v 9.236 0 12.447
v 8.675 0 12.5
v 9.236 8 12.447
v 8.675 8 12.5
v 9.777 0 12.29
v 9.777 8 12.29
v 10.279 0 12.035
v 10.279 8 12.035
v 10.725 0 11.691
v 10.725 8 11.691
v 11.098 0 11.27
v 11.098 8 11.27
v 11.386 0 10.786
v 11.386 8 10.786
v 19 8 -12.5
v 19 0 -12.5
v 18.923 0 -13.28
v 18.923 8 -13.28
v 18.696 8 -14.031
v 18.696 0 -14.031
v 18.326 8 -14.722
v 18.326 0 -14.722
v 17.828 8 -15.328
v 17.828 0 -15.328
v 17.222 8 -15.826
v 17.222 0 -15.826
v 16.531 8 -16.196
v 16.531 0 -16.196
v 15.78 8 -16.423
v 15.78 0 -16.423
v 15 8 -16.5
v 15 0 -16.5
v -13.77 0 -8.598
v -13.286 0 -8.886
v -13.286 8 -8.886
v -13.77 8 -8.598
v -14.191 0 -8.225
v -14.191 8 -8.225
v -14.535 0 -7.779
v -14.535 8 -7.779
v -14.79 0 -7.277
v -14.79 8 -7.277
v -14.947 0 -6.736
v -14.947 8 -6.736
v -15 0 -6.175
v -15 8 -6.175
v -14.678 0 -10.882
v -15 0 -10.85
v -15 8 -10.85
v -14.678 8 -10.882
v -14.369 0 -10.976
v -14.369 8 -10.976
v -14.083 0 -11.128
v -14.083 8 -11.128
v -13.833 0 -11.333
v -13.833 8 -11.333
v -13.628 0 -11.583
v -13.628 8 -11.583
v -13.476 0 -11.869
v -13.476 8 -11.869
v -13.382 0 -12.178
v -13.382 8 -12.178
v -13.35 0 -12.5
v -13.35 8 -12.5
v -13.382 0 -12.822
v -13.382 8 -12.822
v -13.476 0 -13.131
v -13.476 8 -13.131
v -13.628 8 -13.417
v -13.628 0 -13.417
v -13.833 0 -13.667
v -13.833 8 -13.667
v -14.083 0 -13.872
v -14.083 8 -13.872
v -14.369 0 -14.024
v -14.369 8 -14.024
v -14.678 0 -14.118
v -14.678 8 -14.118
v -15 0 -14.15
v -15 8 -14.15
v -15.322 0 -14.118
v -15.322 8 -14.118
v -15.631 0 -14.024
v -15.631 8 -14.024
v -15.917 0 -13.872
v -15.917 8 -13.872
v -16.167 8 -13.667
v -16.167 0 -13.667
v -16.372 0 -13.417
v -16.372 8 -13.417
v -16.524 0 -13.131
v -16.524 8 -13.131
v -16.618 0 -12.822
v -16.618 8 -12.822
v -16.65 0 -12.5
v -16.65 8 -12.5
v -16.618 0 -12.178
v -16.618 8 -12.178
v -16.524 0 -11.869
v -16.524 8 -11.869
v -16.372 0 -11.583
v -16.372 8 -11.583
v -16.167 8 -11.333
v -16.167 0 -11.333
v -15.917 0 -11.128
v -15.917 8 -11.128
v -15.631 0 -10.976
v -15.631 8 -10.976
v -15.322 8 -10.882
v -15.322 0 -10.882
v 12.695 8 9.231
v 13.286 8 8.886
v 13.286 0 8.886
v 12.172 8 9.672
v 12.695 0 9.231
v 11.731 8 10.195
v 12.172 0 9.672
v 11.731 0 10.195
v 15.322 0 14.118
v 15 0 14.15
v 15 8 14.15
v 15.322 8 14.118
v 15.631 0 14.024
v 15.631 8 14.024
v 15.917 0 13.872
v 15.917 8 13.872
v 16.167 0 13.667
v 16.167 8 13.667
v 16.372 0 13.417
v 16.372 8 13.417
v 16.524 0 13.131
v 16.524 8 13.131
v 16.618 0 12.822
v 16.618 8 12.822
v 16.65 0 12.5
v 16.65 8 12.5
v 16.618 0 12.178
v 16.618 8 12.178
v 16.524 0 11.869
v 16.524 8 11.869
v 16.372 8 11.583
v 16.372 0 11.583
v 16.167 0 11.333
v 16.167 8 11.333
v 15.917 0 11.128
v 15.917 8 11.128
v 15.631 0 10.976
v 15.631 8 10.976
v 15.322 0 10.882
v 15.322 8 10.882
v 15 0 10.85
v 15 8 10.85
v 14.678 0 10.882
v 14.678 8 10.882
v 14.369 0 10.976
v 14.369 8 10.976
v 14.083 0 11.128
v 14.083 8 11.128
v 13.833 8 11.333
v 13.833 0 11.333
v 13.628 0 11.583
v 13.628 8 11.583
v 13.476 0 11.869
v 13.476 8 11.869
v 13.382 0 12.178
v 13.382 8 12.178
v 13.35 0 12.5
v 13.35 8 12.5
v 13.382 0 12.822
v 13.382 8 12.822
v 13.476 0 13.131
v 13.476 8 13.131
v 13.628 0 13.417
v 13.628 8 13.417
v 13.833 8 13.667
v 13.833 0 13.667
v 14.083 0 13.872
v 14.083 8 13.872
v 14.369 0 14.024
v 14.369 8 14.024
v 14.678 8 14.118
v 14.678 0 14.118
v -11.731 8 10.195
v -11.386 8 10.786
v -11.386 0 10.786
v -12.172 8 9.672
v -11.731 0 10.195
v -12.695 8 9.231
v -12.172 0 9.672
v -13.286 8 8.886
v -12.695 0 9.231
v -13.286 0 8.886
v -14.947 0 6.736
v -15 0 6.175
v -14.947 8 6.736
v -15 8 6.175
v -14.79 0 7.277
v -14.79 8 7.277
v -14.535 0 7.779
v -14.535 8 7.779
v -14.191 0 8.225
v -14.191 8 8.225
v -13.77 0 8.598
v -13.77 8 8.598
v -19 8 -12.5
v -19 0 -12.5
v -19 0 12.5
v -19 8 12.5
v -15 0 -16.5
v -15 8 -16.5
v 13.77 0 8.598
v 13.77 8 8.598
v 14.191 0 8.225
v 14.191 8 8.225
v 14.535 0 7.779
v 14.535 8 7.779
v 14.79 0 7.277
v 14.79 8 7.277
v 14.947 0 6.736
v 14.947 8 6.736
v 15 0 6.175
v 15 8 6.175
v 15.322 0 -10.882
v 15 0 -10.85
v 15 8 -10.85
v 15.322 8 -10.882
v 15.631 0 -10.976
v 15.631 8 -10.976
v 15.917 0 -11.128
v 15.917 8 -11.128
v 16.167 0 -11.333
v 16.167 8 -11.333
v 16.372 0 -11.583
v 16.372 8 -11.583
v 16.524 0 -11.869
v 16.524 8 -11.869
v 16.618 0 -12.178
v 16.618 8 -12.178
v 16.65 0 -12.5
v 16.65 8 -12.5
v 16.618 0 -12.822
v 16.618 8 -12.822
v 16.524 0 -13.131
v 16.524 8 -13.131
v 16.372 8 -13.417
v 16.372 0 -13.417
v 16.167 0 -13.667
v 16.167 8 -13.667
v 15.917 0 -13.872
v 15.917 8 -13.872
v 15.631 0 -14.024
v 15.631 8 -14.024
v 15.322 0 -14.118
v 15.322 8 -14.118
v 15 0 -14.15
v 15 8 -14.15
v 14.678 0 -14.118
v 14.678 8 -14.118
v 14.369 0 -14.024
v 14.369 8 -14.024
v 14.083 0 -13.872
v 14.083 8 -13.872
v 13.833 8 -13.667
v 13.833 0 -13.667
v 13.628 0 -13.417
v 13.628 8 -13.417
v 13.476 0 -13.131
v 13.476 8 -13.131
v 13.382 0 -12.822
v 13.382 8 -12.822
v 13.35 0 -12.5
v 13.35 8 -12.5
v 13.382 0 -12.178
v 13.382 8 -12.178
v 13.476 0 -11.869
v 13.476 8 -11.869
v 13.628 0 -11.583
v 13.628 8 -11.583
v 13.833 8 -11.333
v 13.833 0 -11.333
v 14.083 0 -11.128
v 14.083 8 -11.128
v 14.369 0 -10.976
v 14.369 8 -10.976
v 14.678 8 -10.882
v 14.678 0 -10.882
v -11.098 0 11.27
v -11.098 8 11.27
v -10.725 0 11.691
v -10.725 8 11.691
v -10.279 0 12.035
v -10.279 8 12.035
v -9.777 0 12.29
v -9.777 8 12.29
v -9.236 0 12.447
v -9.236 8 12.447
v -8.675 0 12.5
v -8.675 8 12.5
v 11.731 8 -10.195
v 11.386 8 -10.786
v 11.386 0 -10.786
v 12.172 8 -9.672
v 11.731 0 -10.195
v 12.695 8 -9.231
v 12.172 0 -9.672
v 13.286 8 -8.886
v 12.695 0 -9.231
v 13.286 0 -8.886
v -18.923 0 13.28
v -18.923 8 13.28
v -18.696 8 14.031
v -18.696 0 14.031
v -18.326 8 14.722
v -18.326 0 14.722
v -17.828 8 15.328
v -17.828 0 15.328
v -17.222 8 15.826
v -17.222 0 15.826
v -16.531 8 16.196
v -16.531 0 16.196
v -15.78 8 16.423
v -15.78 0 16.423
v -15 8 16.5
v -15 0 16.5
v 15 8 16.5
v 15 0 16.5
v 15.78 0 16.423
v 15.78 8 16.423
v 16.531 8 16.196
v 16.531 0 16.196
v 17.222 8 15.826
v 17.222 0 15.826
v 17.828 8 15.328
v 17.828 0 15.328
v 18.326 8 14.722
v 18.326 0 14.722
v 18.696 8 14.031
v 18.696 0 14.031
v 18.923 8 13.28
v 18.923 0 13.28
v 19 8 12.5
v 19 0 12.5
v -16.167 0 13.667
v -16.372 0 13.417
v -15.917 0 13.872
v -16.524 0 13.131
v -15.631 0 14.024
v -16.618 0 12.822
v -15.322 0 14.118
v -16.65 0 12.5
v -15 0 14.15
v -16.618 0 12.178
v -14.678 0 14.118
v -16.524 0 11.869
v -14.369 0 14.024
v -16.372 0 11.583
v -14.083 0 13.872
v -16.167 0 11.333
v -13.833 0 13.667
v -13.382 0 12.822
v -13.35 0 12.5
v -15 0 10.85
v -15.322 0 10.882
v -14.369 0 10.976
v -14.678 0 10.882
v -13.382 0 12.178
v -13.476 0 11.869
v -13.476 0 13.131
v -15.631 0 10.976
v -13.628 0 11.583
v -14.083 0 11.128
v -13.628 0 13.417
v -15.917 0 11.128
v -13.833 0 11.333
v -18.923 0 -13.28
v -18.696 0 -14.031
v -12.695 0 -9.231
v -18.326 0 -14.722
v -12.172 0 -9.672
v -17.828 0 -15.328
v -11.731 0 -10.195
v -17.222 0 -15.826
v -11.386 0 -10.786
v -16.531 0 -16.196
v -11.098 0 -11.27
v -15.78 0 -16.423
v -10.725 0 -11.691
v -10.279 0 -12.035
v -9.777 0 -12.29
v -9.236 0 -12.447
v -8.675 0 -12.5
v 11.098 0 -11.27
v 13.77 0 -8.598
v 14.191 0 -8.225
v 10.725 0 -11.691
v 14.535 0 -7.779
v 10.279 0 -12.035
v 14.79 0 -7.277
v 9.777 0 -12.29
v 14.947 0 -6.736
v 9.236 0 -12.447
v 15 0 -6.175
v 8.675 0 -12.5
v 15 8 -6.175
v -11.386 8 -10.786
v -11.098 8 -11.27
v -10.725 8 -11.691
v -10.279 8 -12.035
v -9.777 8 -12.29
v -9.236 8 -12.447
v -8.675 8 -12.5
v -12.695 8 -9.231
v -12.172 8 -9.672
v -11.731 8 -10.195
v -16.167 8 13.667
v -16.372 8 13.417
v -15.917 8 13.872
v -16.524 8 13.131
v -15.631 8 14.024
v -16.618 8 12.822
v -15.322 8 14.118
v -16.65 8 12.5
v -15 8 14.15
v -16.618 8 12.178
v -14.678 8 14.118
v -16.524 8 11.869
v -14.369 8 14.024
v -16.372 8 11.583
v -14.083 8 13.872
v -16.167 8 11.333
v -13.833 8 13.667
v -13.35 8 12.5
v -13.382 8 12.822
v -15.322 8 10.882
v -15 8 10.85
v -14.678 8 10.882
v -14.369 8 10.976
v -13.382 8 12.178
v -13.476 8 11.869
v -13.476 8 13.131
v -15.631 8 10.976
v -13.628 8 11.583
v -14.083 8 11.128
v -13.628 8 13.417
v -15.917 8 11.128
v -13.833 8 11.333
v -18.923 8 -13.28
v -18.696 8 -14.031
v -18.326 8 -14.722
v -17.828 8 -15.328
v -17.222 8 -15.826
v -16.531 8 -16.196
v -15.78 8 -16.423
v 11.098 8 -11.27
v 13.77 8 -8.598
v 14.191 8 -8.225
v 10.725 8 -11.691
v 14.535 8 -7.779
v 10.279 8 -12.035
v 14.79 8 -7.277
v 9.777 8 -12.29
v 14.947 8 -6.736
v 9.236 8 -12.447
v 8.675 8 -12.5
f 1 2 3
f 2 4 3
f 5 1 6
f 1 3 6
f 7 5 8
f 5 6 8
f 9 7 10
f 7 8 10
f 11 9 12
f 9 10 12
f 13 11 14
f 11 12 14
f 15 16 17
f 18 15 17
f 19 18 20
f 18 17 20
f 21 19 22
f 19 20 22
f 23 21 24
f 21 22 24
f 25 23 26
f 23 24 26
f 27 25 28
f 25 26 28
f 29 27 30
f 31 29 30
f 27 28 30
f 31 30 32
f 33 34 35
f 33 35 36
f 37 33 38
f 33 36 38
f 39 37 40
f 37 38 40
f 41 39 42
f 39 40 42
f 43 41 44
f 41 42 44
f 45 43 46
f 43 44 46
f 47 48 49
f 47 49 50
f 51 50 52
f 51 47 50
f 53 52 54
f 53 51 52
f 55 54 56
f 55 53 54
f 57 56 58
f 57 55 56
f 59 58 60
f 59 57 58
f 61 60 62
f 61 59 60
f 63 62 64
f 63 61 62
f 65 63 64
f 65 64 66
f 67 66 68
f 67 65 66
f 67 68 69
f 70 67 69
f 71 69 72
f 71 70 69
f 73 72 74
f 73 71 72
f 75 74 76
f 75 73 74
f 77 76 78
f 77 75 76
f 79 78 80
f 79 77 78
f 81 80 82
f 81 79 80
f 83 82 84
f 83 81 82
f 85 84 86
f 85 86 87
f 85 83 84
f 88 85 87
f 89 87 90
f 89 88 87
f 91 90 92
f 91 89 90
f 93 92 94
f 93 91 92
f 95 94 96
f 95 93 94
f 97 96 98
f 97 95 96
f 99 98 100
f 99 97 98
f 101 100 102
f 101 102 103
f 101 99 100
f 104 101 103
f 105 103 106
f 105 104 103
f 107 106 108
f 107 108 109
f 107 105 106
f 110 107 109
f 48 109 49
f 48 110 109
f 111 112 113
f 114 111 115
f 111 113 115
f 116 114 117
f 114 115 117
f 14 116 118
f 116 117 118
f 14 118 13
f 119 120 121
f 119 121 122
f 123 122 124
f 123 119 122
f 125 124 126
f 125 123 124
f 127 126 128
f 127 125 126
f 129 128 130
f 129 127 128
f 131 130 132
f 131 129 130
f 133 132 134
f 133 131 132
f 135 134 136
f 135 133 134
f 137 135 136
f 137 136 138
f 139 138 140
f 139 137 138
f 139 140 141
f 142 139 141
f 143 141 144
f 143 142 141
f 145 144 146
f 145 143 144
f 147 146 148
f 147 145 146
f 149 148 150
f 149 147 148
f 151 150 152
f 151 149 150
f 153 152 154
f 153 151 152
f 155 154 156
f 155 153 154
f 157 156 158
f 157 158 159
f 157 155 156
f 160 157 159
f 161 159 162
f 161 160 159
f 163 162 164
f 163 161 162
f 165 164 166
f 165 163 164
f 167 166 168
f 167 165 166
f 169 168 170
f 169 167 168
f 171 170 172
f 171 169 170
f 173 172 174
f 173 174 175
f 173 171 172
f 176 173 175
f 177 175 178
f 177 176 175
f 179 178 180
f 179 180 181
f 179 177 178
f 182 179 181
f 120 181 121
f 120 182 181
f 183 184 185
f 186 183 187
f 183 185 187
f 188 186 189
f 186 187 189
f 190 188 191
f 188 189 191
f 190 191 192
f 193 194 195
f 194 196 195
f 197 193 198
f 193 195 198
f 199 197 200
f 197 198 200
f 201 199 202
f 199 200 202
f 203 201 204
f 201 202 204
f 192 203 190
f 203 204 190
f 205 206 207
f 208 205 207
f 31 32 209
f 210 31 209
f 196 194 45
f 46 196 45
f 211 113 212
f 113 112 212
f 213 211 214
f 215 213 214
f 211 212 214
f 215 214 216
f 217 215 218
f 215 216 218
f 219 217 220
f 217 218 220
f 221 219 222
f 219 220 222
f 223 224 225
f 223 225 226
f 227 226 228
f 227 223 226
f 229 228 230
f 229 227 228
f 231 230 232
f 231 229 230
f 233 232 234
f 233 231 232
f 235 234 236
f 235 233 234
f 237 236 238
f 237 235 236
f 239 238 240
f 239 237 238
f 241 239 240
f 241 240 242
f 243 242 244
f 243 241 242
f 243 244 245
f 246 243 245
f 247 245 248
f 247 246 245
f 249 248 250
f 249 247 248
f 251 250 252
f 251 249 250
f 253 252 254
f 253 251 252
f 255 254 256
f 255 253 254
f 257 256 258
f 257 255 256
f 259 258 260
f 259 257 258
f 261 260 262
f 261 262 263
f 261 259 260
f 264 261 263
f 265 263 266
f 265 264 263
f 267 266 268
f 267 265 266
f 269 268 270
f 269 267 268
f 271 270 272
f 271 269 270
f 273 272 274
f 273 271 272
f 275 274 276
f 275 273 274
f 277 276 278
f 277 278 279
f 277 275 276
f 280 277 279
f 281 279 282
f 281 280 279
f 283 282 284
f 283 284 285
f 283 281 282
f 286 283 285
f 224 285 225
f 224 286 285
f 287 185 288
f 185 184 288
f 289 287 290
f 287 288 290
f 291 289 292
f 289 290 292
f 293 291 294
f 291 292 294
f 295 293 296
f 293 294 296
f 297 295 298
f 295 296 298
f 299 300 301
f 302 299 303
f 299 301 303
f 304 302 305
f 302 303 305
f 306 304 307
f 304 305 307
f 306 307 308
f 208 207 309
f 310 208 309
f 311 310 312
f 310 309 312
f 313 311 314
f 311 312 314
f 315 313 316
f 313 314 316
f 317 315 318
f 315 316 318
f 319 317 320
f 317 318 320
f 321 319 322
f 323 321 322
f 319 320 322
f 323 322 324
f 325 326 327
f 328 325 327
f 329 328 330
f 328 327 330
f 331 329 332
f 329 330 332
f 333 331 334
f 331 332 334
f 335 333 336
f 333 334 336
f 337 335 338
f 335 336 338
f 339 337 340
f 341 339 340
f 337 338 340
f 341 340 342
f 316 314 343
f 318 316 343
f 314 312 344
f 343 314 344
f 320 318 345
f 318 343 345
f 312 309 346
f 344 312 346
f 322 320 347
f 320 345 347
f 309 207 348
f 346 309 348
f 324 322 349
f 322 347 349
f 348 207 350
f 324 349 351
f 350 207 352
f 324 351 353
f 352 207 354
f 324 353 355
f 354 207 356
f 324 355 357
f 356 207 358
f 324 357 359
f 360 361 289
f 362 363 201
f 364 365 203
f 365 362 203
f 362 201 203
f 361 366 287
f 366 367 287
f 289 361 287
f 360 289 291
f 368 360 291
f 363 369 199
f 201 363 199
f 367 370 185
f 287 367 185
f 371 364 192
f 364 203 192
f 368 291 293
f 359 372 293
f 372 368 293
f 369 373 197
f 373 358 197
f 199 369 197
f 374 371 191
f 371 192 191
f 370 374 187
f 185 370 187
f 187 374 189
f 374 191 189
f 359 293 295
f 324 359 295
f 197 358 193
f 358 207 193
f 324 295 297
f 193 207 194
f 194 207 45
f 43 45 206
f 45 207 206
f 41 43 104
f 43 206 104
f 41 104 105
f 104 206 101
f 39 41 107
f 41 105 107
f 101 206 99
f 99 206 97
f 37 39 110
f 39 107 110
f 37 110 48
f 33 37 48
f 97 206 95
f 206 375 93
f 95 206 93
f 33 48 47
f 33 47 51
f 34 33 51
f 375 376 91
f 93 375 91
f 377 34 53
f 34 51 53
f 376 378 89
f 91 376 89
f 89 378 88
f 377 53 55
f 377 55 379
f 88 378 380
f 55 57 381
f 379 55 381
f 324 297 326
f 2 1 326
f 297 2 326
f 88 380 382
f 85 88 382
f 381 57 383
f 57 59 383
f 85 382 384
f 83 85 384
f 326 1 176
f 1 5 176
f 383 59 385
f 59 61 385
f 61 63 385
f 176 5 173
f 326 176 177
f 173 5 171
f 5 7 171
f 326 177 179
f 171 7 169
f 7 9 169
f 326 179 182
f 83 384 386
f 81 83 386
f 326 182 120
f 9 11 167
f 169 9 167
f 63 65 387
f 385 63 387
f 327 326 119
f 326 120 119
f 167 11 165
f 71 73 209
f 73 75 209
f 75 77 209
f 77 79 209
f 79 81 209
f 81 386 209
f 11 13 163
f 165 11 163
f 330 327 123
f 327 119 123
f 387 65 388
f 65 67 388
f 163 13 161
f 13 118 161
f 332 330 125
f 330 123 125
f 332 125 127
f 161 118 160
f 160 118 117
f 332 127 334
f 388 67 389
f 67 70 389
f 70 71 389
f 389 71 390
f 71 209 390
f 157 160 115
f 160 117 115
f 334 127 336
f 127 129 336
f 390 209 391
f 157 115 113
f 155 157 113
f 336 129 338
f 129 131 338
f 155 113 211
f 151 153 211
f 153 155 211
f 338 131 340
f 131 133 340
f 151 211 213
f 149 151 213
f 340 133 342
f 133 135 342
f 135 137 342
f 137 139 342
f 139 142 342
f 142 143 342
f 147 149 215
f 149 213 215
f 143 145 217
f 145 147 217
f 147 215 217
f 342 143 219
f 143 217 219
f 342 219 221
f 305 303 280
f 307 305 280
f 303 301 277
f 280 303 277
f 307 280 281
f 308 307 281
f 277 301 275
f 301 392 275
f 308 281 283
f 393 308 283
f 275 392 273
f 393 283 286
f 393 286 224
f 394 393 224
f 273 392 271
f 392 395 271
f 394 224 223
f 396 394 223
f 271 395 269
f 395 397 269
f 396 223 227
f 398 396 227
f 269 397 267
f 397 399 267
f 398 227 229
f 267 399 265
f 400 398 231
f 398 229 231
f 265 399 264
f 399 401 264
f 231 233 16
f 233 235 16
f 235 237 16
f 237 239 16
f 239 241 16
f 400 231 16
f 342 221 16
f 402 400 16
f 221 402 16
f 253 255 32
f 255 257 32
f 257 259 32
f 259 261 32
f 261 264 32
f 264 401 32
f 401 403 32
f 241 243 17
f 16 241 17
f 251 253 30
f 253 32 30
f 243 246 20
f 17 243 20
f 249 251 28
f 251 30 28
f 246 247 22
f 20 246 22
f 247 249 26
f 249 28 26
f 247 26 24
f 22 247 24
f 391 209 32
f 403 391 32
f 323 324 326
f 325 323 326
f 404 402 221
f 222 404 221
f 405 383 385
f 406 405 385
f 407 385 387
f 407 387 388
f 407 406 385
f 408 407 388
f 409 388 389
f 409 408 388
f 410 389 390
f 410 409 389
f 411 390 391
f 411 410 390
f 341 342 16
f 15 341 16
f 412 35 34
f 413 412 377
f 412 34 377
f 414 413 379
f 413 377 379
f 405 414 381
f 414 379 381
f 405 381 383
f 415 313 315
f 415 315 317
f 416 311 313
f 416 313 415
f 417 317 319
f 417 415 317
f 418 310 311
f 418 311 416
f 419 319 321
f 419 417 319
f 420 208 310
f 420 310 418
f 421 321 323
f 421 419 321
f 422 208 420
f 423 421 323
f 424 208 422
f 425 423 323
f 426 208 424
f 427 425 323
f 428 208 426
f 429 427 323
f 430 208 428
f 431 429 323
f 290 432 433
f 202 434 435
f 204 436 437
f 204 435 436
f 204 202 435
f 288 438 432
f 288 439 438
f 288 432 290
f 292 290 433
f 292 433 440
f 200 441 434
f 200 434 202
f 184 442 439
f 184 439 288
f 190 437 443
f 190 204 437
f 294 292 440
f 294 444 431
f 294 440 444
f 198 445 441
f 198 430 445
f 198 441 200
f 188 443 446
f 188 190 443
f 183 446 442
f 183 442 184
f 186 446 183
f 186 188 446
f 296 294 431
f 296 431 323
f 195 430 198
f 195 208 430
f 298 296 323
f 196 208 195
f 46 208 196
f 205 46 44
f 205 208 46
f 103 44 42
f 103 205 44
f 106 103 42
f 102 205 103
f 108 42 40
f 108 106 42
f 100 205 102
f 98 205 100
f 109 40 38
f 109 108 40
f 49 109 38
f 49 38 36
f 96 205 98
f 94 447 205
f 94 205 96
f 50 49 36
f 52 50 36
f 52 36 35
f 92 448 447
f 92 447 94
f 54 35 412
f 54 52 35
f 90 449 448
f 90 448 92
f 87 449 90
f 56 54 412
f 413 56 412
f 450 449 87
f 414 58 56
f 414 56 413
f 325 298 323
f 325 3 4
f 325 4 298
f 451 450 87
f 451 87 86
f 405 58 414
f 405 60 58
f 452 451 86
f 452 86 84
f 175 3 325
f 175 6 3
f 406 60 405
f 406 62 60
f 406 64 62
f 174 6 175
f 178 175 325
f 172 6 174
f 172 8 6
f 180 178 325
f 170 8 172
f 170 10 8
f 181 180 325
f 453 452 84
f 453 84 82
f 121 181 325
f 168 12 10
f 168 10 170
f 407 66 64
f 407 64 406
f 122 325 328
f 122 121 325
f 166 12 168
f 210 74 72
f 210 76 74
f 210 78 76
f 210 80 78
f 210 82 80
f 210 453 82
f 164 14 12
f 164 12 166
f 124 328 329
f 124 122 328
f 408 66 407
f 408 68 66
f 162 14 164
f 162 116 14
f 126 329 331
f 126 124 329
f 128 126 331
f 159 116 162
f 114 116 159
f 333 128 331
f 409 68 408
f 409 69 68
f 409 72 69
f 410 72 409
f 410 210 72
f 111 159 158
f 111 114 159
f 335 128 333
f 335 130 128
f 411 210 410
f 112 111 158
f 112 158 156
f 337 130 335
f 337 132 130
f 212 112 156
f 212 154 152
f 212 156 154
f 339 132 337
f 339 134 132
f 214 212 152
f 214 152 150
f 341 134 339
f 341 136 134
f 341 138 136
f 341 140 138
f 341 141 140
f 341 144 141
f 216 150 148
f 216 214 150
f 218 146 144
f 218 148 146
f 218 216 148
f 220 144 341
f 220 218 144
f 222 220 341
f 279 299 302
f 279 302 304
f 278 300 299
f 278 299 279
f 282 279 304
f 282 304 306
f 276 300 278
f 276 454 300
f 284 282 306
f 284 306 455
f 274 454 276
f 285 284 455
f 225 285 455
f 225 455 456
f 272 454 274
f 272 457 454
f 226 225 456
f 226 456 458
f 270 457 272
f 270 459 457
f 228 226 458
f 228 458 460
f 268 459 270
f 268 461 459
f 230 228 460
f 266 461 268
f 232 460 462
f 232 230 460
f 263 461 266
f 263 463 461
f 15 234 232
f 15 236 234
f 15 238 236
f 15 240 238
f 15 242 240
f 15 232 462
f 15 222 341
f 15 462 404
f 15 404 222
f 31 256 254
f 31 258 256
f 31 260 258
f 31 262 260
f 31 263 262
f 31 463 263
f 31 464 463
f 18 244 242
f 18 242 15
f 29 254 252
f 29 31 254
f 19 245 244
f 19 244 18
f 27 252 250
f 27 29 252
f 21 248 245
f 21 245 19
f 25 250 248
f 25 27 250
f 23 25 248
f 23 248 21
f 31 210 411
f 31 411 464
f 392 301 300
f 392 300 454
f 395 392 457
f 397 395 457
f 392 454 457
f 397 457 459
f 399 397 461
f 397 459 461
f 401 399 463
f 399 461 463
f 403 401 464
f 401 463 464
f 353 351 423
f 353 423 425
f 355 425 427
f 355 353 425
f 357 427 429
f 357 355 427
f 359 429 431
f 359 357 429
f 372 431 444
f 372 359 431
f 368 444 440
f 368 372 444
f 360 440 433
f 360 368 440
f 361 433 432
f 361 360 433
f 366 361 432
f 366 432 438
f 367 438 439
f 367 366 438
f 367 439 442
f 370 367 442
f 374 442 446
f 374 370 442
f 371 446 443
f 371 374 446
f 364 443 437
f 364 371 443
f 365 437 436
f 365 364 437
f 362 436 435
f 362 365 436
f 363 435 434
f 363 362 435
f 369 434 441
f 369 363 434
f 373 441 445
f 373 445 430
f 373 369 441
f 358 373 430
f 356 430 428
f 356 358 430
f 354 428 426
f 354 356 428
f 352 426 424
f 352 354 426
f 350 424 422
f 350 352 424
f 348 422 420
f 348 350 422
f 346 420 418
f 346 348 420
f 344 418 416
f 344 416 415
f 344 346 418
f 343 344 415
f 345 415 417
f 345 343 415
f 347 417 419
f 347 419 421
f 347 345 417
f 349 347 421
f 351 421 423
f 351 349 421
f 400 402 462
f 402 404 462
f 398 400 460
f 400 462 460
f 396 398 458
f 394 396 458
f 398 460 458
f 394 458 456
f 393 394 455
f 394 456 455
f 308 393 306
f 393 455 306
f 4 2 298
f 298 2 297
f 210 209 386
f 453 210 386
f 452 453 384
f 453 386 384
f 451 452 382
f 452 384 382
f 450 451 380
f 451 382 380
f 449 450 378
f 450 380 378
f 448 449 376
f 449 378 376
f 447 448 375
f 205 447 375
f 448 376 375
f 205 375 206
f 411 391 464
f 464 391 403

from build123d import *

# Parameters (mm, degrees)
SKETCH_1_R      = 1.65
EXTRUDE_1_DEPTH = 8
FILLET_1_R      = 3


with BuildPart() as part:
    # 草图1 → 凸台-拉伸1 (new body)
    with BuildSketch(Plane(origin=(0, 0, 0), x_dir=(1, 0, 0), z_dir=(0, 1, 0))):
        with BuildLine():
            Line((-19, 12.5), (-19, -12.5))
            ThreePointArc((-19, -12.5), (-17.828427125, -15.328427125), (-15, -16.5))
            Line((-15, -16.5), (15, -16.5))
            ThreePointArc((15, -16.5), (17.828427125, -15.328427125), (19, -12.5))
            Line((19, -12.5), (19, 12.5))
            ThreePointArc((19, 12.5), (17.828427125, 15.328427125), (15, 16.5))
            Line((15, 16.5), (-15, 16.5))
            ThreePointArc((-15, 16.5), (-17.828427125, 15.328427125), (-19, 12.5))
        make_face()
        with Locations(Location((-15, 12.5, 0), (0, 0, 270))):
            Circle(SKETCH_1_R, mode=Mode.SUBTRACT)
        with Locations(Location((15, 12.5, 0), (0, 0, 270))):
            Circle(SKETCH_1_R, mode=Mode.SUBTRACT)
        with Locations(Location((-15, -12.5, 0), (0, 0, 270))):
            Circle(SKETCH_1_R, mode=Mode.SUBTRACT)
        with Locations(Location((15, -12.5, 0), (0, 0, 270))):
            Circle(SKETCH_1_R, mode=Mode.SUBTRACT)
        with BuildLine():
            Line((-11, 12.5), (11, 12.5))
            ThreePointArc((11, 12.5), (12.171572875, 9.671572875), (15, 8.5))
            Line((15, 8.5), (15, -8.5))
            ThreePointArc((15, -8.5), (12.171572875, -9.671572875), (11, -12.5))
            Line((11, -12.5), (-11, -12.5))
            ThreePointArc((-11, -12.5), (-12.171572875, -9.671572875), (-15, -8.5))
            Line((-15, -8.5), (-15, 8.5))
            ThreePointArc((-15, 8.5), (-12.171572875, 9.671572875), (-11, 12.5))
        make_face(mode=Mode.SUBTRACT)
    extrude(amount=EXTRUDE_1_DEPTH)

    # 圆角1
    fillet_1_edges = [part.edges().sort_by_distance(p)[0] for p in [
        (-11, 4, -12.5),
        (-15, 4, -8.5),
        (-15, 4, 8.5),
        (-11, 4, 12.5),
        (11, 4, 12.5),
        (15, 4, 8.5),
        (15, 4, -8.5),
        (11, 4, -12.5),
    ]]
    fillet(fillet_1_edges, radius=FILLET_1_R)


solid = part.part
